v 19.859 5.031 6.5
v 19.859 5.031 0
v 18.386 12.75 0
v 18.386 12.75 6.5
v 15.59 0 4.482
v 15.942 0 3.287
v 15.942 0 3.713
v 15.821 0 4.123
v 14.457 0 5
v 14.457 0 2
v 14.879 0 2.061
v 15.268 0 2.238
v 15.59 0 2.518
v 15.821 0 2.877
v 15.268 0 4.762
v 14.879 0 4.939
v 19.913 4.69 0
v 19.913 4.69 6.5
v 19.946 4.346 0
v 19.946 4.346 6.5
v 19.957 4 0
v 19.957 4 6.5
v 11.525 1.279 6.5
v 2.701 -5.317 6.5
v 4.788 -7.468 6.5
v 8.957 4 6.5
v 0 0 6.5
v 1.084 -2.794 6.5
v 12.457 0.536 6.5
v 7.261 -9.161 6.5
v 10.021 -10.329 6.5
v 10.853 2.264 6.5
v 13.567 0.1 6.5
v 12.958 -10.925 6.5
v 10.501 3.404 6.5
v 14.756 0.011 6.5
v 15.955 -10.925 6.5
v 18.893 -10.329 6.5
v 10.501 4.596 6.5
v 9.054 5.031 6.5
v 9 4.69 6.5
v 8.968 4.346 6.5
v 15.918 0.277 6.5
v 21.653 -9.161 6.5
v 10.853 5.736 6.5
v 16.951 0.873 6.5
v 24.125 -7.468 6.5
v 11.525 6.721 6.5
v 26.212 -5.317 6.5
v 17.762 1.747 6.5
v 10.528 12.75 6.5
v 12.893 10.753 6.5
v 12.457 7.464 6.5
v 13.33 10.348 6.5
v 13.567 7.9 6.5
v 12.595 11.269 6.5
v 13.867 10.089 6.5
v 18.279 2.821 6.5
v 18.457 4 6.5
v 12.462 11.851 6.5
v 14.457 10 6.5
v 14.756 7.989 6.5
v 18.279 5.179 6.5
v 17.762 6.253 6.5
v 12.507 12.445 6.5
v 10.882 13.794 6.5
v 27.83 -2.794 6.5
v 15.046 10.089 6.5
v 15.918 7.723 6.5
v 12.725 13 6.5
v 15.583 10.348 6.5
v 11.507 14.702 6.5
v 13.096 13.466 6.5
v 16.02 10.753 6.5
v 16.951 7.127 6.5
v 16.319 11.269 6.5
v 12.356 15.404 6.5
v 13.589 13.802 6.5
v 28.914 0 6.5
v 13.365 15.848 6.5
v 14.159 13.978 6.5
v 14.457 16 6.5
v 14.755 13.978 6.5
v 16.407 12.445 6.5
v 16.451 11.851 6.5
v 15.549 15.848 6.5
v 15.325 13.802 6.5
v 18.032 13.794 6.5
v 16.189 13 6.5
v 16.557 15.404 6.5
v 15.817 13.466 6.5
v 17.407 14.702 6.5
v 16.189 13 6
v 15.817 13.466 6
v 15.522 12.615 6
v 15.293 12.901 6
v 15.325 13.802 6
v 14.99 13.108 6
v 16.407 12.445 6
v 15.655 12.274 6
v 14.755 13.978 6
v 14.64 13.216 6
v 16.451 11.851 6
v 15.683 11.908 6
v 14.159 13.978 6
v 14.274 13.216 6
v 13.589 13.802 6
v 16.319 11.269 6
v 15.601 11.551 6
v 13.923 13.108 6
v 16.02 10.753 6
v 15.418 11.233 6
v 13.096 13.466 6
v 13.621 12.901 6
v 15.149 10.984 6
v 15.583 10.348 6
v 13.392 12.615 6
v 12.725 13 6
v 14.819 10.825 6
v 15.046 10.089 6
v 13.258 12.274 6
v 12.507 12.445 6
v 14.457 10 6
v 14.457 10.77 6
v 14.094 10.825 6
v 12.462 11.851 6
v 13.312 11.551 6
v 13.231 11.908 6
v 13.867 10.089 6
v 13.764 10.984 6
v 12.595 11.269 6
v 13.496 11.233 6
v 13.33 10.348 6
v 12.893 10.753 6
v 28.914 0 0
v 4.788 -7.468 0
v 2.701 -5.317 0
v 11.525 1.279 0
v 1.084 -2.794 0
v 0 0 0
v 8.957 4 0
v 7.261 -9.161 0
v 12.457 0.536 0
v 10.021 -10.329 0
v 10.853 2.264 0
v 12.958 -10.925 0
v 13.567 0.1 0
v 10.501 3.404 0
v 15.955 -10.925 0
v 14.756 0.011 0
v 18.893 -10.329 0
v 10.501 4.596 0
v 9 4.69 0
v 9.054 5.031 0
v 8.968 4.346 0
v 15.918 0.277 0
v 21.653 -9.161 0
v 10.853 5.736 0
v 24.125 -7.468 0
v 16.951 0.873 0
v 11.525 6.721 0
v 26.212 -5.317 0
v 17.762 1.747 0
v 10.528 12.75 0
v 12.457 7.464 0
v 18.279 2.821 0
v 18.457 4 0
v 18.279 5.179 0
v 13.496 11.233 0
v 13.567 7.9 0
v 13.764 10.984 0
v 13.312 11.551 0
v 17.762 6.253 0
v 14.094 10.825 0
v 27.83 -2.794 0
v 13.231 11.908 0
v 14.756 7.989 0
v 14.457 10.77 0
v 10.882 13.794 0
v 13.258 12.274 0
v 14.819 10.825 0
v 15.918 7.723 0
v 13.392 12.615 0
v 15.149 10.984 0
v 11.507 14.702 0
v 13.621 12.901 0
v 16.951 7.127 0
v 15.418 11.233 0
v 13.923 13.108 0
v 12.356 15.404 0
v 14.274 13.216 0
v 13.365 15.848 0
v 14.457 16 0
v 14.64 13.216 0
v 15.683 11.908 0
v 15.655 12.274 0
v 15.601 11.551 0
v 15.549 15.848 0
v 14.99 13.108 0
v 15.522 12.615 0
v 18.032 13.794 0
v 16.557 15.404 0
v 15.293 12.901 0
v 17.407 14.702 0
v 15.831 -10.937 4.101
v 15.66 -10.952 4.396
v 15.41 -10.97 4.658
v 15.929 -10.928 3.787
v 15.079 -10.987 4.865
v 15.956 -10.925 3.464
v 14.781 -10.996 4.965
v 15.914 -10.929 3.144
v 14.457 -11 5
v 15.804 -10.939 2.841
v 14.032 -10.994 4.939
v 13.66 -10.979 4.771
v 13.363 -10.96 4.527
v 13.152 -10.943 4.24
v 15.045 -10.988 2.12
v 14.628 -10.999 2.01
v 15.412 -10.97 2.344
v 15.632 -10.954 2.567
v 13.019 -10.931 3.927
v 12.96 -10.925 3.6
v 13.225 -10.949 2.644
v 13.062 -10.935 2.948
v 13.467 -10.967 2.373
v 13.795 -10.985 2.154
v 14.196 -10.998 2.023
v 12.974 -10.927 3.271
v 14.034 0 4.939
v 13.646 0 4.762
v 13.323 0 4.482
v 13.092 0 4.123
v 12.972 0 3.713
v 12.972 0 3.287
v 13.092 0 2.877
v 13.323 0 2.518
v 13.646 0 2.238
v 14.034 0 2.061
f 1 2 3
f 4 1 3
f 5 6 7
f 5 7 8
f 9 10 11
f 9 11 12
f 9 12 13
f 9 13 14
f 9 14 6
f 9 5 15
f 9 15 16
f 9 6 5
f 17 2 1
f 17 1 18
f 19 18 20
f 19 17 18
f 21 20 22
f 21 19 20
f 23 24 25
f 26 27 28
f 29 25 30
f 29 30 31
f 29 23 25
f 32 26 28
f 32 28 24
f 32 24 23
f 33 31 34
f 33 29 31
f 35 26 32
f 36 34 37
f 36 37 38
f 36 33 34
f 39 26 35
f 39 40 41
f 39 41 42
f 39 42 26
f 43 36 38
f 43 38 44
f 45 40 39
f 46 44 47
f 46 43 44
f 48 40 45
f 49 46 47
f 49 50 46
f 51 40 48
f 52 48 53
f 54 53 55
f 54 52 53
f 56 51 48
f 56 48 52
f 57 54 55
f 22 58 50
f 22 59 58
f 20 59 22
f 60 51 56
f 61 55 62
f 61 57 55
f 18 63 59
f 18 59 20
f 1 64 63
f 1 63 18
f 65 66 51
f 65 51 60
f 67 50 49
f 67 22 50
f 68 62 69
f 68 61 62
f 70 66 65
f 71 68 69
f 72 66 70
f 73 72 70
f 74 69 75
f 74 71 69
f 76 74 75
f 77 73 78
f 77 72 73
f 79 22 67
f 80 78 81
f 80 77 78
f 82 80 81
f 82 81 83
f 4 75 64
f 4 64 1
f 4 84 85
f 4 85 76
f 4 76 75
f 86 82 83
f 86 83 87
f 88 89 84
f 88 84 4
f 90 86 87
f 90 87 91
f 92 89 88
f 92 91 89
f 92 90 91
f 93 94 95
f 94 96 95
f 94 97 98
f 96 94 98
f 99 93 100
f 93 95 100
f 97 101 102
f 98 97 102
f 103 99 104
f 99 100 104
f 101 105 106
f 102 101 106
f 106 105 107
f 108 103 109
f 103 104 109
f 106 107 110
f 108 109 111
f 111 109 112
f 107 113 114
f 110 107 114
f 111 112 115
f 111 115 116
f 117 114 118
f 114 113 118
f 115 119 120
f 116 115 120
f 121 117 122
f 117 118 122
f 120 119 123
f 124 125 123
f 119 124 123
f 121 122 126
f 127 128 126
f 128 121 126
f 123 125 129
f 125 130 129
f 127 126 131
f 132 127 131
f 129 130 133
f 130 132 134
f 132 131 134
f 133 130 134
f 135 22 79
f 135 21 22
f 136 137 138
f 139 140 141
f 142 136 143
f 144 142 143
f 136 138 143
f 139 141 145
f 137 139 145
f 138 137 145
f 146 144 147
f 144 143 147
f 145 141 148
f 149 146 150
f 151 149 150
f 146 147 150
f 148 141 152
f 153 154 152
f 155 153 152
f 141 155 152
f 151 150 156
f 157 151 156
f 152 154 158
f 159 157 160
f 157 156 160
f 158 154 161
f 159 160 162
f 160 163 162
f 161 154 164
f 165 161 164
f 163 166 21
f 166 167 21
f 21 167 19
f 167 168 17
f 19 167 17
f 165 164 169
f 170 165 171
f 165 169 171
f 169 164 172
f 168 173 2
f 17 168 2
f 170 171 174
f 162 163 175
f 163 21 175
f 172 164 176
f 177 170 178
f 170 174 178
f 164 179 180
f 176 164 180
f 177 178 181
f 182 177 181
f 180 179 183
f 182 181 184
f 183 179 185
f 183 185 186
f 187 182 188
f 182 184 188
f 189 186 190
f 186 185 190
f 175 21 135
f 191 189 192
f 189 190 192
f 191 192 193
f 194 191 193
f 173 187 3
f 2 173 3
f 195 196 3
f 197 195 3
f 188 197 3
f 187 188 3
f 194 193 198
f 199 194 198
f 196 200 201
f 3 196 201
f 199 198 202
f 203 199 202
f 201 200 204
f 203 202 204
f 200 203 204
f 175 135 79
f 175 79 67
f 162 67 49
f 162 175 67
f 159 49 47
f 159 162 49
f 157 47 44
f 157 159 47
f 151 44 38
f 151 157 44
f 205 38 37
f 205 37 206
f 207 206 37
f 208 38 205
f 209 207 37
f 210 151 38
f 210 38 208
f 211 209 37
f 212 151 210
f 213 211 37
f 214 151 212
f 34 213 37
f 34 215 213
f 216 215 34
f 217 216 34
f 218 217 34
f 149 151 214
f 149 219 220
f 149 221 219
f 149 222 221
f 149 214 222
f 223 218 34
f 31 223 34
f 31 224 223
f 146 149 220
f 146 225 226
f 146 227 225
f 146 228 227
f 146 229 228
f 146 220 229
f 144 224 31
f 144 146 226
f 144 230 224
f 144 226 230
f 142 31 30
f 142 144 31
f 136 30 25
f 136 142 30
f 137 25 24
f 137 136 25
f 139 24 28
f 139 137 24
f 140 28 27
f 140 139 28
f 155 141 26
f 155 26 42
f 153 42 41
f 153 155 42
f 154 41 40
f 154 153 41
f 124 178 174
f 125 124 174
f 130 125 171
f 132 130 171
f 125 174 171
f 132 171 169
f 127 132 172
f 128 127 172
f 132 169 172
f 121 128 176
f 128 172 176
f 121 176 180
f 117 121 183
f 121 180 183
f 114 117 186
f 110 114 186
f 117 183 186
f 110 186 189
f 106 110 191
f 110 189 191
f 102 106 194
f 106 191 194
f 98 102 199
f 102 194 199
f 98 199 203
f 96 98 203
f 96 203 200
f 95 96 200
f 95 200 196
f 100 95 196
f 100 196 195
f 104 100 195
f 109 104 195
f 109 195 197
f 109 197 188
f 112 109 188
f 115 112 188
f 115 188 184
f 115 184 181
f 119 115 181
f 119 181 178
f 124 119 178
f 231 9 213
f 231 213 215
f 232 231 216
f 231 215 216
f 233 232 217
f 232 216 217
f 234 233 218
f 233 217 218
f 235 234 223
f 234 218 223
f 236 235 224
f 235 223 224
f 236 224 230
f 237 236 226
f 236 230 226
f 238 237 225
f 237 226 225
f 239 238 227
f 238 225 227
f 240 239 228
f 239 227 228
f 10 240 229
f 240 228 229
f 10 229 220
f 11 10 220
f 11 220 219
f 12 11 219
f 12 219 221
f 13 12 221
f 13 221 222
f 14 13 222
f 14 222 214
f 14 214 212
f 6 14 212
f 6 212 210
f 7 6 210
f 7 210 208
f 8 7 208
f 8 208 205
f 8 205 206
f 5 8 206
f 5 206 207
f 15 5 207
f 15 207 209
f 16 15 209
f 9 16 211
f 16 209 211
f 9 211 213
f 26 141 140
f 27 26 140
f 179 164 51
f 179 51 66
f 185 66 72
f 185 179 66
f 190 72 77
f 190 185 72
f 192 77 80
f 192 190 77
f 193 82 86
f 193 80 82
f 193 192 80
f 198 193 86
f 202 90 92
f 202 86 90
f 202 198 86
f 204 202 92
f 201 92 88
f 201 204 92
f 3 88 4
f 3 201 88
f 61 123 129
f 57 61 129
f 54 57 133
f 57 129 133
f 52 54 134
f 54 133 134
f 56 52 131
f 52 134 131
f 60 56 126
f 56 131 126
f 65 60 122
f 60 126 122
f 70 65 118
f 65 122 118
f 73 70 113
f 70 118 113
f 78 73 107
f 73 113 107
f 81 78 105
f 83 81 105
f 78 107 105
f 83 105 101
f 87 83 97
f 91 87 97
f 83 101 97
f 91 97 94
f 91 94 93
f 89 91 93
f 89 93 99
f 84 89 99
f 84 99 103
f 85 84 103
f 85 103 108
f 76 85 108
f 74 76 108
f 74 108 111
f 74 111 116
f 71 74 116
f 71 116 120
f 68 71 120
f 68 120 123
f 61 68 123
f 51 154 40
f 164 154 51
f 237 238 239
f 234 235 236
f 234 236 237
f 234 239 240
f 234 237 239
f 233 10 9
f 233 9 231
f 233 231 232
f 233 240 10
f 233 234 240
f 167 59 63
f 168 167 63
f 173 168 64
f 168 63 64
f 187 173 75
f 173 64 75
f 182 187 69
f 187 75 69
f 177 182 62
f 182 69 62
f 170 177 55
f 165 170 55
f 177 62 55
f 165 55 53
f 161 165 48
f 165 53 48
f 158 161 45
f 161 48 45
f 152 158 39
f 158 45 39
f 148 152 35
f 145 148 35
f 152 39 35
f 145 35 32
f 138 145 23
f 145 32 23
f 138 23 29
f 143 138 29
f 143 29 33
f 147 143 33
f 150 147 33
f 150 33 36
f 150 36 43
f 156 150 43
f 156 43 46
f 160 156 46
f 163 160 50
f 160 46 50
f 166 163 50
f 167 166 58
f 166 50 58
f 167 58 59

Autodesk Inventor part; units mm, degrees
ref_plane "YZ Plane" through (0, 0, 0) normal (1, 0, 0) x (0, 1, 0)
ref_plane "XY Plane" through (0, 0, 0) normal (0, 0, 1) x (1, 0, 0)
sketch "Skizze1" plane through (0, 0, 0) normal (0, 0, 1) x (1, 0, 0)
  line L0 (-0.5432, 4) -> (29.4568, 4) construction
  arc A0 (0, 0) -> (28.9137, 0) centre (14.4568, 4) ccw
  circle A1 centre (14.4568, 4) radius 5.5
  line L1 (19.9568, 4) -> (28.9137, 0)
  line L2 (8.9568, 4) -> (0, 0)
  line L3 (9.0544, 5.0312) -> (10.5278, 12.75)
  line L4 (19.8593, 5.0312) -> (18.3859, 12.75)
  arc A2 (18.3859, 12.75) -> (10.5278, 12.75) centre (14.4568, 12) ccw
  dimension "d2" = 30
  dimension "d3" = 11
  dimension "d4" = 4
  dimension "d5" = 4
  dimension "d6" = 8
extrude "Extrusion1" add sketch "Skizze1" along normal blind 6.5
sketch "Skizze2" plane through (0, 0, 6.5) normal (0, 0, 1) x (1, 0, 0)
  arc A0 (19.9568, 4) -> (19.8593, 5.0312) centre (14.4568, 4) ccw projected
  line L0 (19.8593, 5.0312) -> (18.3859, 12.75) projected
  arc A1 (18.3859, 12.75) -> (10.5278, 12.75) centre (14.4568, 12) ccw projected
  line L1 (10.5278, 12.75) -> (9.0544, 5.0312) projected
  arc A2 (9.0544, 5.0312) -> (8.9568, 4) centre (14.4568, 4) ccw projected
  line L2 (8.9568, 4) -> (0, 0) projected
  arc A3 (0, 0) -> (28.9137, 0) centre (14.4568, 4) ccw projected
  line L3 (28.9137, 0) -> (19.9568, 4) projected
  circle A4 centre (14.4568, 4) radius 4
  dimension "d9" = 8
extrude "Extrusion2" cut sketch "Skizze2" against normal up to surface (6.5 mm away) contours A4
sketch "Skizze3" plane through (0, 0, 6.5) normal (0, 0, 1) x (1, 0, 0)
  circle A0 centre (14.4568, 4) radius 4 projected
  point P0 (0, 0)
  point P1 (14.4568, 12)
  dimension "d12" = 8
hole "Bohrung1" at (14.4568, 12, 6.5) direction (0, 0, -1) diameter 2.459 depth 6.5 counterbore diameter 4 counterbore depth 0.5 thread size "M3x0.5" class "6H" standard "ISO Metric profile"
ref_plane "Arbeitsebene1" through (0, 0, 0) normal (0, 1, 0) x (-1, 0, 0)
sketch "Skizze4" plane through (0, 0, 0) normal (0, 1, 0) x (-1, 0, 0)
  line L0 (0, 6.5) -> (-28.9137, 6.5) projected
  line L1 (0, 0) -> (-28.9137, 0) projected
  line L2 (-28.9137, 0) -> (-28.9137, 6.5) projected
  line L3 (0, 6.5) -> (-28.9137, 6.5) projected
  line L4 (0, 0) -> (0, 6.5) projected
  point P0 (-14.4568, 6.5)
  point P1 (-14.4568, 3.5)
  point P2 (-14.4568, 6.5)
  dimension "d25" = 3
  dimension "d26" = 14.4568
hole "Bohrung2" at (14.4568, 0, 3.5) direction (0, -1, 0) diameter 3 end through all
properties part number "Kurbel" material "Stahl, galvanisiert"
